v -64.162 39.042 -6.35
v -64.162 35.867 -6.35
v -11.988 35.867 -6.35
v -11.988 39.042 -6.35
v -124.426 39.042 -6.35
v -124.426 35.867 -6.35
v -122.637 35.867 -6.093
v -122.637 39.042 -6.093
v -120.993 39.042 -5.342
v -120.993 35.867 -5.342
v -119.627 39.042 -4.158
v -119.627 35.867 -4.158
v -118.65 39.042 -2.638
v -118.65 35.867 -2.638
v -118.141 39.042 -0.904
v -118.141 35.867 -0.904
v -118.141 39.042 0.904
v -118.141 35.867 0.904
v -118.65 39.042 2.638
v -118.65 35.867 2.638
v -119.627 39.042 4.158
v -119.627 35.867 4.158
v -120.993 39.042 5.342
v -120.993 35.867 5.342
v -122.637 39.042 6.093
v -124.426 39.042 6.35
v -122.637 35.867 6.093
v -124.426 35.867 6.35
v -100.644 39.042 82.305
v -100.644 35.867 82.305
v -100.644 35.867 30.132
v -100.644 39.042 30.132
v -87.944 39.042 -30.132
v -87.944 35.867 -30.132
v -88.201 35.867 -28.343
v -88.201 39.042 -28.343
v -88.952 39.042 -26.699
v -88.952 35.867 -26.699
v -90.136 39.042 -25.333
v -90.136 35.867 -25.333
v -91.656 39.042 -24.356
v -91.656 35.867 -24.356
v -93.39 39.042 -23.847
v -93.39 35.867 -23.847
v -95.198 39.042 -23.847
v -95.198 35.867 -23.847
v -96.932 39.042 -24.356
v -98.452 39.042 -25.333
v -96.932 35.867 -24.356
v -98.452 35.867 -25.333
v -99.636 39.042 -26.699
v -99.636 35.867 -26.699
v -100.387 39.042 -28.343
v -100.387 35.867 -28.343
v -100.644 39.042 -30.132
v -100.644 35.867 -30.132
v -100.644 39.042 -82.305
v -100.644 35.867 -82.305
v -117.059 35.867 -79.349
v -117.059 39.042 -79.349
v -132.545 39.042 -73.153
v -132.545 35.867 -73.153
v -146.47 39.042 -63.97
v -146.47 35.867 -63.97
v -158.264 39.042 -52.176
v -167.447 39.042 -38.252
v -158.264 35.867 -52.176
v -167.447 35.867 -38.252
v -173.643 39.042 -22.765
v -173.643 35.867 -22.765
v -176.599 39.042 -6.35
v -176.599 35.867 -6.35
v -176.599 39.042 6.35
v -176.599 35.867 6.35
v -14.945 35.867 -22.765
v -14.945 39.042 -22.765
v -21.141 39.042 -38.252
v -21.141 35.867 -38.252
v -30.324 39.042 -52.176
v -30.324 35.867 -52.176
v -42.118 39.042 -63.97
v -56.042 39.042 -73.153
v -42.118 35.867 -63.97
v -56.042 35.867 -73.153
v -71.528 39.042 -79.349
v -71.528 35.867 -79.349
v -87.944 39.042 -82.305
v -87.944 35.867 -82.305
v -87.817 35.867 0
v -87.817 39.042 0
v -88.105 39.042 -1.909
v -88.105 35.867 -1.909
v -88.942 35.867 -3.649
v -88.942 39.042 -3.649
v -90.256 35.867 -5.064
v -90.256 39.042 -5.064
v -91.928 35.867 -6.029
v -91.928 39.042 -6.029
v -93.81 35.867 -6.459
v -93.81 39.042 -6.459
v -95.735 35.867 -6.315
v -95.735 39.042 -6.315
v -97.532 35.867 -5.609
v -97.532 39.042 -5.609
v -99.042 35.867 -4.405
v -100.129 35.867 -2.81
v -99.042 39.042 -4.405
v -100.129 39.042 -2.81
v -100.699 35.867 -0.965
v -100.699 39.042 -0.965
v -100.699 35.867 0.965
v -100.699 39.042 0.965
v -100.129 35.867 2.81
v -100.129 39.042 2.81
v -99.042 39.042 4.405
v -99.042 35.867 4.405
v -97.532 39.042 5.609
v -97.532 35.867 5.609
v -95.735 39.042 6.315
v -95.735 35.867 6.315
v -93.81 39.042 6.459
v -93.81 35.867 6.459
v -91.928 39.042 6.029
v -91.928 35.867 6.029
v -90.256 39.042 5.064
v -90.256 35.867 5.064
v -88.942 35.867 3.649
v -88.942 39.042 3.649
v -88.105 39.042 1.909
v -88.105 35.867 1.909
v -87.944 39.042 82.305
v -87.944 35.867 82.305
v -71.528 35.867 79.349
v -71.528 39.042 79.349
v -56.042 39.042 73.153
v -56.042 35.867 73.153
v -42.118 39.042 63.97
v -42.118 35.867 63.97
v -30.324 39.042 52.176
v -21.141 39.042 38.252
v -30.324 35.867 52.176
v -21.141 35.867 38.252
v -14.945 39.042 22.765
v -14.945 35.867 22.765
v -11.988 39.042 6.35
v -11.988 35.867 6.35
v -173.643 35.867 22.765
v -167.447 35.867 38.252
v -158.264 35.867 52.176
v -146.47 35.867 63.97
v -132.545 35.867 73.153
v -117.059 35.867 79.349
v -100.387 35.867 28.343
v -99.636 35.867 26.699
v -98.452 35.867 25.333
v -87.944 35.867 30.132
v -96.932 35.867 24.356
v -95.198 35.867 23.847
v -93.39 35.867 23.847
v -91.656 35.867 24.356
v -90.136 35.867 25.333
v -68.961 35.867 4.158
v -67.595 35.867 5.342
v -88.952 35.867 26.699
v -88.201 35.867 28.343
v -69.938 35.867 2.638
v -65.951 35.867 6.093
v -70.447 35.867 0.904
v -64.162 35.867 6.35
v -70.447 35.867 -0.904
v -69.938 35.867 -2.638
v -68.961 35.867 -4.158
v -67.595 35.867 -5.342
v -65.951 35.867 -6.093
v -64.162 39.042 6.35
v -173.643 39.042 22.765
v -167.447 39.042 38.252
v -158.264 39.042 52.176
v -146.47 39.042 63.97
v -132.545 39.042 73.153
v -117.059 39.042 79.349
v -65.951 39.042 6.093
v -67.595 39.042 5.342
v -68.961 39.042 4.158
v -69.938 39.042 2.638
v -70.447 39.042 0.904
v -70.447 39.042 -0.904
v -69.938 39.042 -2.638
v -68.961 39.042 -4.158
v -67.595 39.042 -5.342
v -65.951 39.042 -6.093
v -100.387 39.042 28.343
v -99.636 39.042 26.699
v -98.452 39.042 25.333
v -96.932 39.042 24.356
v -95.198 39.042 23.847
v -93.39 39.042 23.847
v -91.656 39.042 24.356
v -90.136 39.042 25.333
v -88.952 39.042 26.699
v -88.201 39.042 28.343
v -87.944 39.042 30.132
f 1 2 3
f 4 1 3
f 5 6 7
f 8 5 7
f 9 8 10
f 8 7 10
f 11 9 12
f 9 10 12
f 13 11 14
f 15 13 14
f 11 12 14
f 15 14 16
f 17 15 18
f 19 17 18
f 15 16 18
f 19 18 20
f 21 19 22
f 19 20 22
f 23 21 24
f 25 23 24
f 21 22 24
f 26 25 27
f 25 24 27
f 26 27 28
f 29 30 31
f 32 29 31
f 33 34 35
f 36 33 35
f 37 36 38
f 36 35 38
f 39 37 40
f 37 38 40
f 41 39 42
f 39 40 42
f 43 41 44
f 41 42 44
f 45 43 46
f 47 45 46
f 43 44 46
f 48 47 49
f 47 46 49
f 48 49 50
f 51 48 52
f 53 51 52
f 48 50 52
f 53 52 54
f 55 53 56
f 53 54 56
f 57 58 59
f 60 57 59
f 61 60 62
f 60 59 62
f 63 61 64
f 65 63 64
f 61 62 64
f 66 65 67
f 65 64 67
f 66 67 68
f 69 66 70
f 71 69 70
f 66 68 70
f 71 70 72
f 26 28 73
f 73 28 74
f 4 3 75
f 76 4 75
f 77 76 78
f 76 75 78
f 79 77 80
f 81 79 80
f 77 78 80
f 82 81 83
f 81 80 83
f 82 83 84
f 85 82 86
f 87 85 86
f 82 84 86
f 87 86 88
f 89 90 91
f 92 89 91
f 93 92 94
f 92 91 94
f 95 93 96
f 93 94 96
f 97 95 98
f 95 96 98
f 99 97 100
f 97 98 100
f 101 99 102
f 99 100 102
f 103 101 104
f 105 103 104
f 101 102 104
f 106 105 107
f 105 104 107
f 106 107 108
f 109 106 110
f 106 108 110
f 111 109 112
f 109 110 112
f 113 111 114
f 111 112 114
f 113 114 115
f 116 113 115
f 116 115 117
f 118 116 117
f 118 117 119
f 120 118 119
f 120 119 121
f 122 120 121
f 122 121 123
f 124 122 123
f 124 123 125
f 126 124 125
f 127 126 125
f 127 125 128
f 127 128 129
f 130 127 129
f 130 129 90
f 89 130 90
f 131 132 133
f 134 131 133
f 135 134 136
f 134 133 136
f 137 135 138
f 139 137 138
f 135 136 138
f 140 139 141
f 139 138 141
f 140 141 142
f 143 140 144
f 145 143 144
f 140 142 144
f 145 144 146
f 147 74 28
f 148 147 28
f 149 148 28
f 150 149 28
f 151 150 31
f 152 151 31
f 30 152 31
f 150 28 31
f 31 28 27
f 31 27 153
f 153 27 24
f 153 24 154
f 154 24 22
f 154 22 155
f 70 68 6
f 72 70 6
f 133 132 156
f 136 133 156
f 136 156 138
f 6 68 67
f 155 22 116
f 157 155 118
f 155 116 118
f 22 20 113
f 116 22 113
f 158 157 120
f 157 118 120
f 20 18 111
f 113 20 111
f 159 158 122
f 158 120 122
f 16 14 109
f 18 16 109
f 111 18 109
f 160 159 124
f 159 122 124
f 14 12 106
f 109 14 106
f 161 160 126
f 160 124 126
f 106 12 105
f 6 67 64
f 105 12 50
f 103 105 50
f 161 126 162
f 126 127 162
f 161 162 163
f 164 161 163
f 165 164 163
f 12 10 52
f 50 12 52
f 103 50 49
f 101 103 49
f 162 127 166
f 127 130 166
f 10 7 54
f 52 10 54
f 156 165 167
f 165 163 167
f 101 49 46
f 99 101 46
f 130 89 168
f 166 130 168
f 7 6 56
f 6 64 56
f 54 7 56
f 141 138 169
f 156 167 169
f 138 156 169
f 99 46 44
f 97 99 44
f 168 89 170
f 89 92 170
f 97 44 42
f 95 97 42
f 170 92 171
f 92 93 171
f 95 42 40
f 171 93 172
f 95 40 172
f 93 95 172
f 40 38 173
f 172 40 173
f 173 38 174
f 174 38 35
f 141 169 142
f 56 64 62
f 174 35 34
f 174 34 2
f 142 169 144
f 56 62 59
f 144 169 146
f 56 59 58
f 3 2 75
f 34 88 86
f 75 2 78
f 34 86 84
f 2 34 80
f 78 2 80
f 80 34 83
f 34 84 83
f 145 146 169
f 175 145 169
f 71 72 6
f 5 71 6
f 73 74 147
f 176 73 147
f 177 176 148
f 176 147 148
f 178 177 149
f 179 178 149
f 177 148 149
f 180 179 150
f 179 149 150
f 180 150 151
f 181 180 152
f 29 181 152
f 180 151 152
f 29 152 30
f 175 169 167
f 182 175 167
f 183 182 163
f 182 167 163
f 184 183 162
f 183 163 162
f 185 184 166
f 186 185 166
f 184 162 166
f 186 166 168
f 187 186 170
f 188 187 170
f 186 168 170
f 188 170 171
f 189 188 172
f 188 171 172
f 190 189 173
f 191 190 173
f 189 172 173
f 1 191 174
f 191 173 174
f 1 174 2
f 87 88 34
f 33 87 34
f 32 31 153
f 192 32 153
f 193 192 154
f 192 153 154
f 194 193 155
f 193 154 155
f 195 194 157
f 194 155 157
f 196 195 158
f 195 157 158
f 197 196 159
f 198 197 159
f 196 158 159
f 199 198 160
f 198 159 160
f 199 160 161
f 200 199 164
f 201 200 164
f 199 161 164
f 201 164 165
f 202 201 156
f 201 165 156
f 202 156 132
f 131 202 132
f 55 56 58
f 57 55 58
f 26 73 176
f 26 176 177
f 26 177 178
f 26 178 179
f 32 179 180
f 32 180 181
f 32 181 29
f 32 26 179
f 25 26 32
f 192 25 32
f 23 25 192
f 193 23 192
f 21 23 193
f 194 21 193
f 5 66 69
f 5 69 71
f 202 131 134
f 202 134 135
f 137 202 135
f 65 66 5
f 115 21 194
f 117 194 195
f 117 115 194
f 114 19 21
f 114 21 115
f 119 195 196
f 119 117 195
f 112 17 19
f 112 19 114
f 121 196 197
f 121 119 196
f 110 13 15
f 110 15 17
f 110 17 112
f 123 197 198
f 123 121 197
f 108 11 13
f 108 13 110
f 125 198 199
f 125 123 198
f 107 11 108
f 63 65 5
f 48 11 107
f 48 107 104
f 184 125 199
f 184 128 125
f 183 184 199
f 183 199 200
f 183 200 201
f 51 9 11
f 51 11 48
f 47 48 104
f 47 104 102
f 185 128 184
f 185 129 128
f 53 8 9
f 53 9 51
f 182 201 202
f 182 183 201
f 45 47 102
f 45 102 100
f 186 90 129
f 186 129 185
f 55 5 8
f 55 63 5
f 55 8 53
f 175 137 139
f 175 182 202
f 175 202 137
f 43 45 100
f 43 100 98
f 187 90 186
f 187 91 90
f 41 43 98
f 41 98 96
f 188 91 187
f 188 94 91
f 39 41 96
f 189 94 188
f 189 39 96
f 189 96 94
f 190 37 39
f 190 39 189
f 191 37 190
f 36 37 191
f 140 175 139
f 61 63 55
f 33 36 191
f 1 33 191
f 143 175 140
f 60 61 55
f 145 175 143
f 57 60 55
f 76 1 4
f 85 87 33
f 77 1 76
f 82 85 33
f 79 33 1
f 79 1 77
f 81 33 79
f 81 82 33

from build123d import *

# Parameters (mm, degrees)
BOSS_EXTRUDE1_DEPTH = 3.175
CUT_EXTRUDE1_REACH  = 5.175
SKETCH5_R           = 6.477


with BuildPart() as part:
    # Sketch4 → Boss-Extrude1 (new body)
    with BuildSketch(Plane(origin=(0, 35.86734, 0), x_dir=(1, 0, 0), z_dir=(0, 1, 0))):
        with BuildLine():
            Line((-176.599307952, 6.35), (-124.425974424, 6.35))
            ThreePointArc((-124.425974424, 6.35), (-118.075974424, 0), (-124.425974424, -6.35))
            Line((-124.425974424, -6.35), (-176.599307952, -6.35))
            ThreePointArc((-176.599307952, -6.35), (-152.665565869, -58.371664787), (-100.643901082, -82.30540687))
            Line((-100.643901082, -82.30540687), (-100.643901082, -30.132073341))
            ThreePointArc((-100.643901082, -30.132073341), (-94.293901082, -23.782073341), (-87.943901082, -30.132073341))
            Line((-87.943901082, -30.132073341), (-87.943901082, -82.30540687))
            ThreePointArc((-87.943901082, -82.30540687), (-35.922236295, -58.371664787), (-11.988494212, -6.35))
            Line((-11.988494212, -6.35), (-64.161827741, -6.35))
            ThreePointArc((-64.161827741, -6.35), (-70.511827741, 0), (-64.161827741, 6.35))
            Line((-64.161827741, 6.35), (-11.988494212, 6.35))
            ThreePointArc((-11.988494212, 6.35), (-35.922236295, 58.371664787), (-87.943901082, 82.30540687))
            Line((-87.943901082, 82.30540687), (-87.943901082, 30.132073341))
            ThreePointArc((-87.943901082, 30.132073341), (-94.293901082, 23.782073341), (-100.643901082, 30.132073341))
            Line((-100.643901082, 30.132073341), (-100.643901082, 82.30540687))
            ThreePointArc((-100.643901082, 82.30540687), (-152.665565869, 58.371664787), (-176.599307952, 6.35))
        make_face()
    extrude(amount=BOSS_EXTRUDE1_DEPTH)

    # Sketch5 → Cut-Extrude1 (cut, up to next)
    with BuildSketch(Plane(origin=(0, 39.04234, 0), x_dir=(1, 0, 0), z_dir=(0, 1, 0)), mode=Mode.PRIVATE) as cut_extrude1_sk1:
        with Locations((-94.293901082, 0)):
            Circle(SKETCH5_R)
    cut_extrude1_tool1 = extrude(cut_extrude1_sk1.sketch, amount=-CUT_EXTRUDE1_REACH, mode=Mode.PRIVATE) & part.part
    add(cut_extrude1_tool1.solids().sort_by_distance((-94.293901, 39.04234, 0))[0], mode=Mode.SUBTRACT)


solid = part.part
